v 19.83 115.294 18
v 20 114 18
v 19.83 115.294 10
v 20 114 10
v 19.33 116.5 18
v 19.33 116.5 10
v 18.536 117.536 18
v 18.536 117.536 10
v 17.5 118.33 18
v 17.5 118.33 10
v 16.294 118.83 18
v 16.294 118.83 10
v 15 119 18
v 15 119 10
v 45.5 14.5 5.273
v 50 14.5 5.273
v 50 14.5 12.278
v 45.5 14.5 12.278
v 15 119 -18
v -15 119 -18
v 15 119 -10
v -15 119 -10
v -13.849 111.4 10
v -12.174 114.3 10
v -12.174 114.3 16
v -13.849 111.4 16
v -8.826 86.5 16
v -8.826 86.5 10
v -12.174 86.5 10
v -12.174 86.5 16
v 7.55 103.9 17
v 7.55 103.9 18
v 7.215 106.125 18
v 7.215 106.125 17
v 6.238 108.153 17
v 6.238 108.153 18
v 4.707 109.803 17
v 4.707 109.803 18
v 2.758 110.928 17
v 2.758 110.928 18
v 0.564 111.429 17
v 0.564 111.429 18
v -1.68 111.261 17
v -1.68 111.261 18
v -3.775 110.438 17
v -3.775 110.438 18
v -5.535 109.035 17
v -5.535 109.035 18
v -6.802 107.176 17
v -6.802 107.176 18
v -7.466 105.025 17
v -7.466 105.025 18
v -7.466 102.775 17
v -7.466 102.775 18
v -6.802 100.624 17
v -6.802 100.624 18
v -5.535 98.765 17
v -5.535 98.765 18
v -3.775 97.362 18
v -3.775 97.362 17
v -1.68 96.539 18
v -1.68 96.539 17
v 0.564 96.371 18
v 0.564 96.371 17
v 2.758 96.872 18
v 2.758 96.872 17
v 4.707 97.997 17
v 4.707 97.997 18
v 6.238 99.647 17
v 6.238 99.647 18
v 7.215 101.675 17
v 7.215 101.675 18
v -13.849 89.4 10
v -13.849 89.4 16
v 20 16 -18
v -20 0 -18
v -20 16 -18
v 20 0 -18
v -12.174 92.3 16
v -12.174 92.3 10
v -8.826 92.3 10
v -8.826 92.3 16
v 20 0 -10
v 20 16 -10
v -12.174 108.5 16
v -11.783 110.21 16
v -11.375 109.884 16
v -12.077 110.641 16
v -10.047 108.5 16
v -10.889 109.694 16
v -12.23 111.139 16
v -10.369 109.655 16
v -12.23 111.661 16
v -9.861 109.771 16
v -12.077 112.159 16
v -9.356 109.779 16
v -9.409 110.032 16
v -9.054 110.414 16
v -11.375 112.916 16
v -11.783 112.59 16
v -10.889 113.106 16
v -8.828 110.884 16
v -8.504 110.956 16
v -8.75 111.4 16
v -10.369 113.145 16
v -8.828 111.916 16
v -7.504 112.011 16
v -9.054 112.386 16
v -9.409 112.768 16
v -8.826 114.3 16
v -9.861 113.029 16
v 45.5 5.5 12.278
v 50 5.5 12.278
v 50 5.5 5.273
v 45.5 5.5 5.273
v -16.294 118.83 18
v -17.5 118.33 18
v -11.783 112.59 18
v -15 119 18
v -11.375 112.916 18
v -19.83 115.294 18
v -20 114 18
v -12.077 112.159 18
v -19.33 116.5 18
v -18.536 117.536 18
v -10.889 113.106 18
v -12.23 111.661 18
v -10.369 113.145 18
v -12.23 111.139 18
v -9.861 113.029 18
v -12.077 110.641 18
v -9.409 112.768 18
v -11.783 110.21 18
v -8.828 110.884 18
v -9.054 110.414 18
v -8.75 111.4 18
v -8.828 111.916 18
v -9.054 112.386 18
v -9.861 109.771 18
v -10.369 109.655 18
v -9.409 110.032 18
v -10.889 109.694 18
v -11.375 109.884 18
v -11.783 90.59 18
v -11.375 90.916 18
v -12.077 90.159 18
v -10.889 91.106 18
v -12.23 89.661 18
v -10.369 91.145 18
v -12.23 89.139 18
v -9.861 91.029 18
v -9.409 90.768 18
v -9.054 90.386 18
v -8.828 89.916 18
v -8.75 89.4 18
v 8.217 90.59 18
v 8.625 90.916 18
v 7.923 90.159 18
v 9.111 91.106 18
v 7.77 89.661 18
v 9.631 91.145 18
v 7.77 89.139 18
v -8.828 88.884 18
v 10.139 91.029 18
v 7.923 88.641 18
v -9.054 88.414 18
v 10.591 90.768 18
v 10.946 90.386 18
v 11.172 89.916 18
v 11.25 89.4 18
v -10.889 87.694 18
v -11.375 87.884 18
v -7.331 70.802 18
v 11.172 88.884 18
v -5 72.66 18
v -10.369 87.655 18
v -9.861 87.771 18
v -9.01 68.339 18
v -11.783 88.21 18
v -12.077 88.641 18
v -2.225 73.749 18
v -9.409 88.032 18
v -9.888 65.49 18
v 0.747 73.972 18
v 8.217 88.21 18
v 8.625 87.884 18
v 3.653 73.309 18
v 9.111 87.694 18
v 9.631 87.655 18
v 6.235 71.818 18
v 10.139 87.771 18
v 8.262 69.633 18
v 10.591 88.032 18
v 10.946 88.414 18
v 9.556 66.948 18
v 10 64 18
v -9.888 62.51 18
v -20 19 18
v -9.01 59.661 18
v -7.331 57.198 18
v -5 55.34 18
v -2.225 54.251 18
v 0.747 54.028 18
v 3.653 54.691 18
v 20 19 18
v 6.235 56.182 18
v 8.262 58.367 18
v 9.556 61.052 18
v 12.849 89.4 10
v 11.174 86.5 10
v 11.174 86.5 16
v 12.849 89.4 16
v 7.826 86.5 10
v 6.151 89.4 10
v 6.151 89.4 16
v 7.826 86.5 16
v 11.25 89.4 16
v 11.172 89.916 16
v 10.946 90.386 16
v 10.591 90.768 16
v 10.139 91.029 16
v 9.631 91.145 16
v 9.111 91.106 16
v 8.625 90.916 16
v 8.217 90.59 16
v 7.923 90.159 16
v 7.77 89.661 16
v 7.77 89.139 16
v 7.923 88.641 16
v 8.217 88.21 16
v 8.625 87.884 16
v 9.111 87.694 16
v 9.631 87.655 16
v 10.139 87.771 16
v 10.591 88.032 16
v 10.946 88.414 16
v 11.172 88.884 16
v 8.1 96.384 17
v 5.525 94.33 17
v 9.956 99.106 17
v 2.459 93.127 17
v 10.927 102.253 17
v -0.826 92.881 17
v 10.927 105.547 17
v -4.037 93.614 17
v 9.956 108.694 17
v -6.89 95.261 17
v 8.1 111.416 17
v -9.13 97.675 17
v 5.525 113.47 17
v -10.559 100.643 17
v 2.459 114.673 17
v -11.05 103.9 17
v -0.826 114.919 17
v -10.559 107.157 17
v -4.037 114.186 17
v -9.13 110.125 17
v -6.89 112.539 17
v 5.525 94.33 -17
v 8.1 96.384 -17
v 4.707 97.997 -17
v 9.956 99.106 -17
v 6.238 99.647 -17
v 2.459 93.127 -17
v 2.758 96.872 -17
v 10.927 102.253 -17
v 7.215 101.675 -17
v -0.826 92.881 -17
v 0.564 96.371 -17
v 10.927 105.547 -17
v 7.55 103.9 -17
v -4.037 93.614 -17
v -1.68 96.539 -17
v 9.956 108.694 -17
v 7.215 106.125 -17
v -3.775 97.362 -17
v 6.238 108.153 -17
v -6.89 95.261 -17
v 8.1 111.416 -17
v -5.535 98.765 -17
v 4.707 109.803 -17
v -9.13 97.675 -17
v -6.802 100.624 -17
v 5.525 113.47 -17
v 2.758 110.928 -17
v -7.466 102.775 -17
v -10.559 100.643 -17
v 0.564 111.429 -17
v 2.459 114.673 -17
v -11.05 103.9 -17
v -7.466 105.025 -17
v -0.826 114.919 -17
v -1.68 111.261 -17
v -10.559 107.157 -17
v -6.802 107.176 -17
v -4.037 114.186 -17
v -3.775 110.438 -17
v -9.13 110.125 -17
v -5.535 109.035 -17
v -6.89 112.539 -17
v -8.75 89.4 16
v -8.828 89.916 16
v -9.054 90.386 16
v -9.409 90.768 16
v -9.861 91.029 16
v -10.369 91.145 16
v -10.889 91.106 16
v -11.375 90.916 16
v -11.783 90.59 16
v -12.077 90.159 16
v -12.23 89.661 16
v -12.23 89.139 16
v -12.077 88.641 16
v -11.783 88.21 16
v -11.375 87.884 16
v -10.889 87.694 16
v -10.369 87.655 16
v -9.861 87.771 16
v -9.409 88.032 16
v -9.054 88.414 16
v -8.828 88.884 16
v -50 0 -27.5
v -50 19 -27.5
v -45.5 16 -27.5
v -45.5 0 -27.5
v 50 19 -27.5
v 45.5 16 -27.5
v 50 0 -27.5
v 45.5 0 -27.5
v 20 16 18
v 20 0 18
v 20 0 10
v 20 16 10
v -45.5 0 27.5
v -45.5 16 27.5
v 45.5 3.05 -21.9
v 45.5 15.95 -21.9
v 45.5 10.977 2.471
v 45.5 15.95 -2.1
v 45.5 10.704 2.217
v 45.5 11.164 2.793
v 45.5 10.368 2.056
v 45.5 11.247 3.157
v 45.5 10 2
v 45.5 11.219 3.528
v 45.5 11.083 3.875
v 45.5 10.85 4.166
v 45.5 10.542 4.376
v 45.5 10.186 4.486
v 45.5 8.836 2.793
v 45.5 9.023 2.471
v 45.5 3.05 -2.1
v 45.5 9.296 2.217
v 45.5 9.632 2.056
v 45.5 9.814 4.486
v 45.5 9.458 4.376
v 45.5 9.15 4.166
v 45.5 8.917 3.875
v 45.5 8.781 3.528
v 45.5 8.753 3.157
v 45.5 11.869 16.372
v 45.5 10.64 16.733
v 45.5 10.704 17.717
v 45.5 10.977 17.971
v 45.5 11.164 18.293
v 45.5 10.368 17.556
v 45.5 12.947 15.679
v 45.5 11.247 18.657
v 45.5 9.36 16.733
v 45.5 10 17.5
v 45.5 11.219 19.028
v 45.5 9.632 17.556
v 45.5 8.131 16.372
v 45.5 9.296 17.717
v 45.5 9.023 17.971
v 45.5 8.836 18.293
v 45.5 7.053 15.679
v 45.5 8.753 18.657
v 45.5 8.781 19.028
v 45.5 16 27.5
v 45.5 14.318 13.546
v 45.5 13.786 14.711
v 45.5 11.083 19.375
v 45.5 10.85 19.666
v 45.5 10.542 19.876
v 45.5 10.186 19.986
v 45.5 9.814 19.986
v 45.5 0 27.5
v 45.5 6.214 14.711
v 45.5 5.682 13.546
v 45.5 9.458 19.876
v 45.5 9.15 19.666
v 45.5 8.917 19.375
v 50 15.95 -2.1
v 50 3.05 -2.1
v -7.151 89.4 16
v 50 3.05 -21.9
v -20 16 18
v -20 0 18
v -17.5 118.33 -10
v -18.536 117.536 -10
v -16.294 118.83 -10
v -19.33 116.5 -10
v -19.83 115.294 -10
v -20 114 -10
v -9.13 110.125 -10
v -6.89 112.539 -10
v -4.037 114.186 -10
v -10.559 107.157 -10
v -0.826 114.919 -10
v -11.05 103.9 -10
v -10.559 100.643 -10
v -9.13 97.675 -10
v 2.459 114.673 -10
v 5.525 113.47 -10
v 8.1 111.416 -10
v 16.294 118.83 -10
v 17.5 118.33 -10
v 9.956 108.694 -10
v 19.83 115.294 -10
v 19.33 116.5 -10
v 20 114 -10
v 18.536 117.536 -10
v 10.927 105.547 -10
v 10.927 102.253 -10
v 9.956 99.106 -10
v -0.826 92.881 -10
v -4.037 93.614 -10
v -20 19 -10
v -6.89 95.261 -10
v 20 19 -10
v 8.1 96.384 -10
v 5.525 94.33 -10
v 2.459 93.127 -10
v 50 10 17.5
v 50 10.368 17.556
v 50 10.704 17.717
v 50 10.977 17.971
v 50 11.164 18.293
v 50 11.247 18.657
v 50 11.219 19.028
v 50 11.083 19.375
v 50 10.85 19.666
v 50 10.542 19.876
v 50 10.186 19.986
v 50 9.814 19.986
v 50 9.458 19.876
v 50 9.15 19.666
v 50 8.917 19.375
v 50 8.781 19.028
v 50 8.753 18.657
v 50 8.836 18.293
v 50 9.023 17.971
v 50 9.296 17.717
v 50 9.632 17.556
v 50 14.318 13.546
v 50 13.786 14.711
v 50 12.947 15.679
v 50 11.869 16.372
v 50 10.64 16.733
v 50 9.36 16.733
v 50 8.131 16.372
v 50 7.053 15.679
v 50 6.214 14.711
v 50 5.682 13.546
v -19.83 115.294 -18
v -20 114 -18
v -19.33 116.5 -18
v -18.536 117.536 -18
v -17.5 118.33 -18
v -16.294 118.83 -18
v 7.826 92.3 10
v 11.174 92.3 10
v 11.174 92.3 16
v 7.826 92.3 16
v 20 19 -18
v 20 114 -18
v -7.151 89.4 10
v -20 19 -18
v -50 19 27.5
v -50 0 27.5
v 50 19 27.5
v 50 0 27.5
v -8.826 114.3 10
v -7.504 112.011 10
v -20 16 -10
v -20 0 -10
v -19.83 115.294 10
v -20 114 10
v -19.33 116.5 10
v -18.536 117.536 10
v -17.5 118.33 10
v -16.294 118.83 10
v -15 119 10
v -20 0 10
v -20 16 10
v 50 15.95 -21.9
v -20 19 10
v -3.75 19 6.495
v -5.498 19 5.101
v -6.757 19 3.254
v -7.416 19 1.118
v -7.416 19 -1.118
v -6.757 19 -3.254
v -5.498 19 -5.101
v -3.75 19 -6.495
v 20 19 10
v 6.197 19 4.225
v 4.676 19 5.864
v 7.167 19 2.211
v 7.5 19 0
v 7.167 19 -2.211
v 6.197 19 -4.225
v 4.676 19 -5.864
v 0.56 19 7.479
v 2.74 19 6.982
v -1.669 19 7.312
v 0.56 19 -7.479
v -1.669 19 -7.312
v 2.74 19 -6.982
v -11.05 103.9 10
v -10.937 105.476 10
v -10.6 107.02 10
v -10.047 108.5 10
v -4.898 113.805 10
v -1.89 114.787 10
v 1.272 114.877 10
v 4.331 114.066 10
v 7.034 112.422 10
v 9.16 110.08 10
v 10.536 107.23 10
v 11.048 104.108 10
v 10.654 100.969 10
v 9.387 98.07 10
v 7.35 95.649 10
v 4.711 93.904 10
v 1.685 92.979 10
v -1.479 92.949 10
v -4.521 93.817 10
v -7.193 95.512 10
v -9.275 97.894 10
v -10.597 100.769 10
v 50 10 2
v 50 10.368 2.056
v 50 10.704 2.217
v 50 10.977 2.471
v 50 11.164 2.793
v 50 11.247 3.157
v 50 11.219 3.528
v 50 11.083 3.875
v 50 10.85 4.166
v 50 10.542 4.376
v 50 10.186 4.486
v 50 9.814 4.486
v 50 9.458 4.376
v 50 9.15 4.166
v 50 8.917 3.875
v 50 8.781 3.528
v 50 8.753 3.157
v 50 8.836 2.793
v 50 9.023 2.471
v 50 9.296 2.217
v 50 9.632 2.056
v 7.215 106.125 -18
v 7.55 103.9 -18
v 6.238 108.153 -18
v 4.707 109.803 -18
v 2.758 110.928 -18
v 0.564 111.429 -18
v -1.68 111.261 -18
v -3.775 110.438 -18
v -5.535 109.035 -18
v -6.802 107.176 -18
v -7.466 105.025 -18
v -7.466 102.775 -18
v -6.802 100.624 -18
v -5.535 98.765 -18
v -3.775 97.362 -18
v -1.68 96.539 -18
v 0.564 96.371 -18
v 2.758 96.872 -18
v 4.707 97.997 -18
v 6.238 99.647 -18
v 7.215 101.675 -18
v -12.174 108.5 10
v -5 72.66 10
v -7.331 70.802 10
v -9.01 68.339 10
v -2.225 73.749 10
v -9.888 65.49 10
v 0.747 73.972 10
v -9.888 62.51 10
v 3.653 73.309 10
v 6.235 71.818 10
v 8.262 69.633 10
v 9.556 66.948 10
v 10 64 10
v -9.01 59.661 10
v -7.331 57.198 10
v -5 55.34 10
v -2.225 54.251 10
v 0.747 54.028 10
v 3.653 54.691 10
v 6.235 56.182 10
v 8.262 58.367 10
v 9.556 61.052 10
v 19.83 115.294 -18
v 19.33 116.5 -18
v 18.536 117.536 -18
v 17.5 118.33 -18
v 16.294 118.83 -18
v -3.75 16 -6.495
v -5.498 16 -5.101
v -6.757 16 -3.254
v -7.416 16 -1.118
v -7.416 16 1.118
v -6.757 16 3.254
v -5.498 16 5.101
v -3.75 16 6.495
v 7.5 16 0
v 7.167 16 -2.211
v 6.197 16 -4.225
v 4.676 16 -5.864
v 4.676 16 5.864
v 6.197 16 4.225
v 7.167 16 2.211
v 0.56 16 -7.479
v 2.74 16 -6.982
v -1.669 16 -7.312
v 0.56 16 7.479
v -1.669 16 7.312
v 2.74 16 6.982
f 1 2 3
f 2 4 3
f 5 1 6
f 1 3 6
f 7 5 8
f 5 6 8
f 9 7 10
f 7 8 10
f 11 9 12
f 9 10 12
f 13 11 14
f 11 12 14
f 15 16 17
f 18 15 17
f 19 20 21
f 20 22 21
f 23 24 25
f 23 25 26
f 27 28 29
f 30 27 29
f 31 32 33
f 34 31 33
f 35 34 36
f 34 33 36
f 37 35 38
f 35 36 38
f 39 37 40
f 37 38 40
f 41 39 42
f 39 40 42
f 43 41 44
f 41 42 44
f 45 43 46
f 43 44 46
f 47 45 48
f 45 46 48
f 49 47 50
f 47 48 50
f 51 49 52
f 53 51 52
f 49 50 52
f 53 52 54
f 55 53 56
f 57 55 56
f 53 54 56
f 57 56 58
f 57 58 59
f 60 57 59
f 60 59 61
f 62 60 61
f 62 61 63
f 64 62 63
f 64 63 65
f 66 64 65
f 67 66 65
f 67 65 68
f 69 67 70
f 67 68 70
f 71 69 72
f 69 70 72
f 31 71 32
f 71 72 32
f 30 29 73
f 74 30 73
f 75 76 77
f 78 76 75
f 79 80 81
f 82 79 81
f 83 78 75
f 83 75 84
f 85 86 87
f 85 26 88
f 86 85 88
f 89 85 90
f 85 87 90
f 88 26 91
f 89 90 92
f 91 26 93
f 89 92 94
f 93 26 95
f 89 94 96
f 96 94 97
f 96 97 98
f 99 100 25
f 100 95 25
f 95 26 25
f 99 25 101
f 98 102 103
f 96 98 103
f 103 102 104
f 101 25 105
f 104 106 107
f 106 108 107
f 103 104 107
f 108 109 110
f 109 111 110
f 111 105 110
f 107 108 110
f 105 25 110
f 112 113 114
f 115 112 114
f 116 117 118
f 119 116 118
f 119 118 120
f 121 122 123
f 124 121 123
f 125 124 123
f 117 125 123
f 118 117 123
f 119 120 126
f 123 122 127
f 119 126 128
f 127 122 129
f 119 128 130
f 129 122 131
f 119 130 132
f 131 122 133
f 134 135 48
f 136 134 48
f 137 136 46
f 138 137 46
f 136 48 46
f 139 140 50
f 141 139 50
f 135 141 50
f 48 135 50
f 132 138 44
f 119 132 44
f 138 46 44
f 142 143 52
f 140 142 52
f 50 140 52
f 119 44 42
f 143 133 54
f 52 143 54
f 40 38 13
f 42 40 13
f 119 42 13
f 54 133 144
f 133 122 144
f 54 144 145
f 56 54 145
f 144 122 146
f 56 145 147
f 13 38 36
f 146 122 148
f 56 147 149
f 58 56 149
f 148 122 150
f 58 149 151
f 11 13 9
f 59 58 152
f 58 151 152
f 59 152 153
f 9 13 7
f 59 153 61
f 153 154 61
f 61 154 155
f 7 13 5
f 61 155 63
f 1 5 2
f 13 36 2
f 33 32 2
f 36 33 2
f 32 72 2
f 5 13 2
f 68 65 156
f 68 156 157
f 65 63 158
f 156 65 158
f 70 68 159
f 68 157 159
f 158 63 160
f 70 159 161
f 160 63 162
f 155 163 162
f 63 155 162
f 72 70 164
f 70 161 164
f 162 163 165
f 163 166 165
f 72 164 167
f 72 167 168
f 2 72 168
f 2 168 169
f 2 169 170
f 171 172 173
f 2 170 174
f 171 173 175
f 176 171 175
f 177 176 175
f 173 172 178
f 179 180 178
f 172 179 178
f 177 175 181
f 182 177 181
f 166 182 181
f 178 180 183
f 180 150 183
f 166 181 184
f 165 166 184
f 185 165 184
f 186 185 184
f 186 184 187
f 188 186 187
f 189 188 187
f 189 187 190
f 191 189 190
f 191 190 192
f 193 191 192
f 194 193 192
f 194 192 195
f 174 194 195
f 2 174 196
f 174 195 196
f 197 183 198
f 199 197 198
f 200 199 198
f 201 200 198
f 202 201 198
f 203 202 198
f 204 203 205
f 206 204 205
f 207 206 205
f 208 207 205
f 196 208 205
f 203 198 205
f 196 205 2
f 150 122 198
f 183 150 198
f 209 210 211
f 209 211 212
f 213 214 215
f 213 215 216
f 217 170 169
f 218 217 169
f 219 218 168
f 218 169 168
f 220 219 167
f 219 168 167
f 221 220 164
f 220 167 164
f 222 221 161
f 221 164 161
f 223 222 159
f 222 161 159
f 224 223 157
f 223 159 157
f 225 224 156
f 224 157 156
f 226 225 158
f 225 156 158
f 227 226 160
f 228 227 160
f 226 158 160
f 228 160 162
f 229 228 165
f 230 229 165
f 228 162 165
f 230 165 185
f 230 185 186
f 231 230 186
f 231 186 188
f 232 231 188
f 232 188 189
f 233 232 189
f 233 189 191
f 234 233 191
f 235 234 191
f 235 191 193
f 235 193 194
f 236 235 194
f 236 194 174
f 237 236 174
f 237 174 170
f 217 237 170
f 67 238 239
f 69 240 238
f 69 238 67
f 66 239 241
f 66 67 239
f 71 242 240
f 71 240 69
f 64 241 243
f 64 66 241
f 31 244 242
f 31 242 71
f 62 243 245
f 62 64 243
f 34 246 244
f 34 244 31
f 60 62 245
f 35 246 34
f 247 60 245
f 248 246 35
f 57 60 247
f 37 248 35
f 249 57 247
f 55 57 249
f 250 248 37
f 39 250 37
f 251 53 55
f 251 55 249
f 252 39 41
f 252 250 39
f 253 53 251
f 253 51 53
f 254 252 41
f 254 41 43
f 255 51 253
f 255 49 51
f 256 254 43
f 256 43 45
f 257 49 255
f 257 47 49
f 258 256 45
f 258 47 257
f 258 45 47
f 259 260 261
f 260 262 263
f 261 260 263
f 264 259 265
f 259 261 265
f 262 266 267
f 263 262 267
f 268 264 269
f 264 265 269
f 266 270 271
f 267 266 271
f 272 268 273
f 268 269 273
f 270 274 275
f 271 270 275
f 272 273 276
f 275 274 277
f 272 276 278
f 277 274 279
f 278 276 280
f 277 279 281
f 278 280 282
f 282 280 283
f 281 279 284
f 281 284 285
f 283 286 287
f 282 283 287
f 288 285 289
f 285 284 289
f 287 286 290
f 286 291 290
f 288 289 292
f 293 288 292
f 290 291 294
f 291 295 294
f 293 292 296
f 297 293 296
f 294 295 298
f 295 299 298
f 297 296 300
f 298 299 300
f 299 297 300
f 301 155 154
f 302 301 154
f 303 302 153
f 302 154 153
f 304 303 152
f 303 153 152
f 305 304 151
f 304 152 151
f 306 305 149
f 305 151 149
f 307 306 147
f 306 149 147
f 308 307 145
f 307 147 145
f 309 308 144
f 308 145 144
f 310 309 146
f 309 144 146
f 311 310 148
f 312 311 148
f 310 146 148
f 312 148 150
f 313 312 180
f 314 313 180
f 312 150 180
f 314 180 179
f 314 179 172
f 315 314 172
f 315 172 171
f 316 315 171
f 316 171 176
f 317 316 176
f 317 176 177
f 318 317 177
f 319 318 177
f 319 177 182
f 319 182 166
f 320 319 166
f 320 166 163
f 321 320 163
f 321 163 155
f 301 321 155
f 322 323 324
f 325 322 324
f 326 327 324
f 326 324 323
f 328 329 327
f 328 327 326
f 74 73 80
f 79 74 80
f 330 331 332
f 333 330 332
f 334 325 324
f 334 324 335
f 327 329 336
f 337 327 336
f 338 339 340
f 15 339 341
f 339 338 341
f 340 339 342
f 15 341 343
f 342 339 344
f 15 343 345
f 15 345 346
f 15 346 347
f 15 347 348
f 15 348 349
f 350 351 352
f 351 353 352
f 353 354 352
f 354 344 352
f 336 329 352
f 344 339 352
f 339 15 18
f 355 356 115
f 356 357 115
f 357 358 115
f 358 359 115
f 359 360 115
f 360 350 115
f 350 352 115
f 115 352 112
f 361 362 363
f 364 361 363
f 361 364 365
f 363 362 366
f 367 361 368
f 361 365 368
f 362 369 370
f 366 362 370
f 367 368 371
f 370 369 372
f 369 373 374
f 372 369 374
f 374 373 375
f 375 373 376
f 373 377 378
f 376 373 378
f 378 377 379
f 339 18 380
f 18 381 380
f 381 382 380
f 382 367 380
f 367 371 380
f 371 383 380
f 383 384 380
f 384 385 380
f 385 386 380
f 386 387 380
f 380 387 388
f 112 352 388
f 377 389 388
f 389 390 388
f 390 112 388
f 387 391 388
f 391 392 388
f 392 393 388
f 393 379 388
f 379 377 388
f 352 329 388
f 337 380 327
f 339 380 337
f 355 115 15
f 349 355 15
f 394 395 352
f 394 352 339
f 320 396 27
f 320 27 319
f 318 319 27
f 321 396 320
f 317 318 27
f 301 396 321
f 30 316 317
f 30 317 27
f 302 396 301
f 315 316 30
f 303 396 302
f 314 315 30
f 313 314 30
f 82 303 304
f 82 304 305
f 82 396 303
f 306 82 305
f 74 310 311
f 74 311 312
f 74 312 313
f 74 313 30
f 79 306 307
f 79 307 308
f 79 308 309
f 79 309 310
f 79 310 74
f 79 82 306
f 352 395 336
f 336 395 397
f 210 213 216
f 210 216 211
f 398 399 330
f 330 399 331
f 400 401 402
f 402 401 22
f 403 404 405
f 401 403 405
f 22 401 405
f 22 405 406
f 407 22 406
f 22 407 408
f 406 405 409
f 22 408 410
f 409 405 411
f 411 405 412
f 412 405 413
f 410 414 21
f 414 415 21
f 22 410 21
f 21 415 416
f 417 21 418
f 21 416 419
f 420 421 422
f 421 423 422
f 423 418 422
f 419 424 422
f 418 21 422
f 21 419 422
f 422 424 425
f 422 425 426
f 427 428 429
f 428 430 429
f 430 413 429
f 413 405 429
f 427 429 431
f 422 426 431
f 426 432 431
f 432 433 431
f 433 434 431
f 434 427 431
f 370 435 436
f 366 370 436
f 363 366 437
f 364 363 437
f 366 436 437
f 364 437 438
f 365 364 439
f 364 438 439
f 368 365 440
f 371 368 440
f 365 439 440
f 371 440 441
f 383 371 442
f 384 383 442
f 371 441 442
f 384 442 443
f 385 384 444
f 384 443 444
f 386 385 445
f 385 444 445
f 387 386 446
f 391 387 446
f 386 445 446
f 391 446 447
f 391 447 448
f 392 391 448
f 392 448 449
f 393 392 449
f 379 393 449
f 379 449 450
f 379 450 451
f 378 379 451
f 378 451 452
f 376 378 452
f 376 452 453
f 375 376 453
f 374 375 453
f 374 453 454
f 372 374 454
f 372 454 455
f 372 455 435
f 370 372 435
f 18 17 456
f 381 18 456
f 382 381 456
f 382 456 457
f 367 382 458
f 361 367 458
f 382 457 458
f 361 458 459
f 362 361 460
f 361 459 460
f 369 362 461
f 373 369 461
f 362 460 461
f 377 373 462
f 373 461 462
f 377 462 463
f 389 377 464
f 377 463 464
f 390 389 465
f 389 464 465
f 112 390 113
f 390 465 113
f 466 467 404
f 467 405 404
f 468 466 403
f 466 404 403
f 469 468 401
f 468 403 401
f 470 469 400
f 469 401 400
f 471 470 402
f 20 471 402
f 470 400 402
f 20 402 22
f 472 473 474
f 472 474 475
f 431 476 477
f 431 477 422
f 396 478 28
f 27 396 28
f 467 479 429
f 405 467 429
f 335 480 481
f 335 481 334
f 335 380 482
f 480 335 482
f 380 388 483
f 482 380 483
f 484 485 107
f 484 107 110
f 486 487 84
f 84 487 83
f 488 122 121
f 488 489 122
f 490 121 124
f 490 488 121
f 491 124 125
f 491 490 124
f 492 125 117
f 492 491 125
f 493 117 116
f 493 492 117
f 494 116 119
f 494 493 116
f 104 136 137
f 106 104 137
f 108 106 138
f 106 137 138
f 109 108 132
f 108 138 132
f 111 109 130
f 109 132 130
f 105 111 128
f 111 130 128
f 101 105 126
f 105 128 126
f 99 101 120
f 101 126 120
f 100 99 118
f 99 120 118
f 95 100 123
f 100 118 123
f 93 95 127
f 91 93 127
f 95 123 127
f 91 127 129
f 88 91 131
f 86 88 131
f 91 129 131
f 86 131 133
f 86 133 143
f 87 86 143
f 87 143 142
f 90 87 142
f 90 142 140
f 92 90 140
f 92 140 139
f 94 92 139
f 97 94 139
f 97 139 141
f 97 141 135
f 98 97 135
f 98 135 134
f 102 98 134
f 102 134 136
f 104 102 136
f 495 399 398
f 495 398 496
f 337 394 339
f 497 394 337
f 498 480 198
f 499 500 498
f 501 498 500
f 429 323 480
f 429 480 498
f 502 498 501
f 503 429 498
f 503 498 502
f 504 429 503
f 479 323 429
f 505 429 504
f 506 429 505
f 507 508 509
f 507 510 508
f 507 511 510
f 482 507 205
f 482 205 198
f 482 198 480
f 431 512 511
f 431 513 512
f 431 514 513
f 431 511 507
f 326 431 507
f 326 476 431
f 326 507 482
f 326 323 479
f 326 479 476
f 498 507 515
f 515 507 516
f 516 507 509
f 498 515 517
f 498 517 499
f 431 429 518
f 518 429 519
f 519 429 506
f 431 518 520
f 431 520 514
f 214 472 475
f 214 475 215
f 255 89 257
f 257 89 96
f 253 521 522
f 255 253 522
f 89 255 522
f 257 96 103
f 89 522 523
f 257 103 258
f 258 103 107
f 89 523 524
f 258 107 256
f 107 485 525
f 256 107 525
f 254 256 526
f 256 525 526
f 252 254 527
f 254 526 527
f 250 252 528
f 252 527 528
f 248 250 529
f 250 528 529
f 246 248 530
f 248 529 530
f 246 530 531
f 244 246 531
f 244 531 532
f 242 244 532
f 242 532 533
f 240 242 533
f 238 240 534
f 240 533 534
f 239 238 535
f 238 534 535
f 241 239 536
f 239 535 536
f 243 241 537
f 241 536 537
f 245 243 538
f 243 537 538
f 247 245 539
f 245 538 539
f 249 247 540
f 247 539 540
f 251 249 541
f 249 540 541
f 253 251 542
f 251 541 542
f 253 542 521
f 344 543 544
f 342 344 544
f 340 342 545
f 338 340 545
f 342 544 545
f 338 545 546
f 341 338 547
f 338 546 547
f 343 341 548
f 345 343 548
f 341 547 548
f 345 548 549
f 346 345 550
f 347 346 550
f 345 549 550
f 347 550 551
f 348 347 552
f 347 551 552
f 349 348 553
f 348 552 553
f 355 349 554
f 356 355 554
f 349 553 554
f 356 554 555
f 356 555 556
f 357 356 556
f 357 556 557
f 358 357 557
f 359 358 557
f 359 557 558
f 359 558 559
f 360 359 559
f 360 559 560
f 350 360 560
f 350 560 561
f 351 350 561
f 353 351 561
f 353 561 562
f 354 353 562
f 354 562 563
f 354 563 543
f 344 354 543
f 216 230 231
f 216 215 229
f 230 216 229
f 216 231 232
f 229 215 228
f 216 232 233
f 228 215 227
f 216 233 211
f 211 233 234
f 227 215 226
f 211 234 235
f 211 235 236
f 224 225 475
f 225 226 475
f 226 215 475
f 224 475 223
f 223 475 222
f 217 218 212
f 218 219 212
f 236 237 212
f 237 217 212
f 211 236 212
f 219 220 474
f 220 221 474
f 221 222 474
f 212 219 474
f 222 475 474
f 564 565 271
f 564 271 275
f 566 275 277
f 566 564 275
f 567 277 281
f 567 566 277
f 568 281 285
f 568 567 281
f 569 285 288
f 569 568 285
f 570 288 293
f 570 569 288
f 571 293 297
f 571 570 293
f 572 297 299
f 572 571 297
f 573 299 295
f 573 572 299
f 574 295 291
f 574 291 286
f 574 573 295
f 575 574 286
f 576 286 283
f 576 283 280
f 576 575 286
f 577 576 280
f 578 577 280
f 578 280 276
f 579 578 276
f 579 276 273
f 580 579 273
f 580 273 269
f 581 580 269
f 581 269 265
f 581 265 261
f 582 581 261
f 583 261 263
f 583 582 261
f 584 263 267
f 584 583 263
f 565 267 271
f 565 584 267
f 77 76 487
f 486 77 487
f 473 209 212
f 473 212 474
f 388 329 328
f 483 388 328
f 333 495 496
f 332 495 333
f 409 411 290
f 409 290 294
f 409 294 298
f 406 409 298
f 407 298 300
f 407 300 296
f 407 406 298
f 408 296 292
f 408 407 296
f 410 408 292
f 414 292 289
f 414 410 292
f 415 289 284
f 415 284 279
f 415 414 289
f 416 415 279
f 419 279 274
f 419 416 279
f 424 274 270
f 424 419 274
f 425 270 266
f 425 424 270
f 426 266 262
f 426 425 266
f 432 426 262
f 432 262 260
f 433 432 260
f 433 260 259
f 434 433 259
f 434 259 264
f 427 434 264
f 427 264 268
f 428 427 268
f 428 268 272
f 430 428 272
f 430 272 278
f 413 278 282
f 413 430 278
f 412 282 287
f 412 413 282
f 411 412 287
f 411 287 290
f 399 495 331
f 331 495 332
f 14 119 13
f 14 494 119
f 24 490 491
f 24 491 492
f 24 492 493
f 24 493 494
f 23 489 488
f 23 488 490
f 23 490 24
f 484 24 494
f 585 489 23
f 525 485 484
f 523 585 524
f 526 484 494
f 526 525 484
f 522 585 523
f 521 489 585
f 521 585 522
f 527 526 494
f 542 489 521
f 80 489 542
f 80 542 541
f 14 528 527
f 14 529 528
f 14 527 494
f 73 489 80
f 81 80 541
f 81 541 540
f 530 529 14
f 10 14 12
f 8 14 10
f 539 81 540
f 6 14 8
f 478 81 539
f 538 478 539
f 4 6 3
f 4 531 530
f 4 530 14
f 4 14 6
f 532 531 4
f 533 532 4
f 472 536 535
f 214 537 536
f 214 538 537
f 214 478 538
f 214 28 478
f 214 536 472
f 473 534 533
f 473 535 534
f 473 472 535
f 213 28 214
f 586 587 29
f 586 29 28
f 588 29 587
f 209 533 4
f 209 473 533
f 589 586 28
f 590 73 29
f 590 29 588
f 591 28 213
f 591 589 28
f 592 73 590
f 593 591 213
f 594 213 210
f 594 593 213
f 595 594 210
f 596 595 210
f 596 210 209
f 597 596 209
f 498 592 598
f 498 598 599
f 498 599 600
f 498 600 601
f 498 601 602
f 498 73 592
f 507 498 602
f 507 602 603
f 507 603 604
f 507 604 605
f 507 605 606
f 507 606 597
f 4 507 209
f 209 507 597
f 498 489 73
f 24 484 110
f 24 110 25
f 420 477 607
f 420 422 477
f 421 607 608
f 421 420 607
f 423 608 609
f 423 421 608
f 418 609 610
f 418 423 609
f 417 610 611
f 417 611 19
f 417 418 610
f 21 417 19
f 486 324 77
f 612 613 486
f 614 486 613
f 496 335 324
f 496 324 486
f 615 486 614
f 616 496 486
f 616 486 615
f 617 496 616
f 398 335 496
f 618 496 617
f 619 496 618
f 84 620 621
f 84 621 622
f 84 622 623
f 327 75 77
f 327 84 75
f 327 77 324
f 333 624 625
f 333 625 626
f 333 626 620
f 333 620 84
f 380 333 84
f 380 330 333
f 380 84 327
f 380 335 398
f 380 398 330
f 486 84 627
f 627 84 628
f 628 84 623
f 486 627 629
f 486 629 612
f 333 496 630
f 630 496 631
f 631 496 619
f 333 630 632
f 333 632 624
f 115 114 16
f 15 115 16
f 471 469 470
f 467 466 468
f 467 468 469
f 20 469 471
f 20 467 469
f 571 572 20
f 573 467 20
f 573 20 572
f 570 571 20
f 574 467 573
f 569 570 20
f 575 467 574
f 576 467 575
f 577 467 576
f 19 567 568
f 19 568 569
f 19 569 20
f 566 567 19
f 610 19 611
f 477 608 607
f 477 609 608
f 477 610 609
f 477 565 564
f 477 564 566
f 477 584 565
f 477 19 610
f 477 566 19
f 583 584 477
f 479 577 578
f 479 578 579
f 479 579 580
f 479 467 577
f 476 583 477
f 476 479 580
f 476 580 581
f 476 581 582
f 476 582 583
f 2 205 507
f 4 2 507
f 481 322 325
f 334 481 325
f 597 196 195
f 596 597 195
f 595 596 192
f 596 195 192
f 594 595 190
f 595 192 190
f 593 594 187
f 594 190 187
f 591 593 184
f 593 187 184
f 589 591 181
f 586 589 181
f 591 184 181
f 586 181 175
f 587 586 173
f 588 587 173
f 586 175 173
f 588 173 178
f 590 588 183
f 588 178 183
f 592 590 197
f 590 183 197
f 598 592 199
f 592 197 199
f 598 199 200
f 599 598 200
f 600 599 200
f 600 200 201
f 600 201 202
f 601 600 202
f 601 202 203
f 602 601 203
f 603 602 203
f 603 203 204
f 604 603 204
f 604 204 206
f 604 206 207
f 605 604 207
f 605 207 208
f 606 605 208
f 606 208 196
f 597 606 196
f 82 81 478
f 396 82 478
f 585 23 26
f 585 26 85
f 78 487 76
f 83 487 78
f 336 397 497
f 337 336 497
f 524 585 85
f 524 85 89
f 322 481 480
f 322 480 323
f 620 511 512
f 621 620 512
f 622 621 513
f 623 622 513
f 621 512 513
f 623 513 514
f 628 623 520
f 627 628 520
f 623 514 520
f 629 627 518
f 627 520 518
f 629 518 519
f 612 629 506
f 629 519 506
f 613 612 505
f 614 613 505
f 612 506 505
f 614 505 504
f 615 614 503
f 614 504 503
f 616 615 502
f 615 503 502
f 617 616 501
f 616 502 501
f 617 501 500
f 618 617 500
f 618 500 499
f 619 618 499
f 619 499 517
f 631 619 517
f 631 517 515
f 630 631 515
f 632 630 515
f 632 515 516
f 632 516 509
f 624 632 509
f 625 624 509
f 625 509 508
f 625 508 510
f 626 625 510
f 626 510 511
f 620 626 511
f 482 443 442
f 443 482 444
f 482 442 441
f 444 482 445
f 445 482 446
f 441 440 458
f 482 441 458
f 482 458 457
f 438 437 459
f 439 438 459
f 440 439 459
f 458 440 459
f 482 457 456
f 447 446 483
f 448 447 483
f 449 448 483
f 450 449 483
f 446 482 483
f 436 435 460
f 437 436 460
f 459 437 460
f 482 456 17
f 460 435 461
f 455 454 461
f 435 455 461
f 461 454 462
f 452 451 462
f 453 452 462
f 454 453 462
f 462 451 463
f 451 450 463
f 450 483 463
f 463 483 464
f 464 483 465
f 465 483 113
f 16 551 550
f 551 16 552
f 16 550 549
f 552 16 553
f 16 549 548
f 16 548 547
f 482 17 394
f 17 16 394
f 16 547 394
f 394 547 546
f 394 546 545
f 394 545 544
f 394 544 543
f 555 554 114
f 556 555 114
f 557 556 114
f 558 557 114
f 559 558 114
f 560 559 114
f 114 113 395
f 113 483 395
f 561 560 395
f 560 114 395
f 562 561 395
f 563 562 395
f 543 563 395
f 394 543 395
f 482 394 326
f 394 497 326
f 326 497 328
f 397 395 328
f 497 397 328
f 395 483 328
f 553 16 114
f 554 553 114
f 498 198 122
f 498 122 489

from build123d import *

# Parameters (mm, degrees)
SKETCH1_W            = 100
SKETCH1_H            = 55
BOSS_EXTRUDE1_DEPTH  = 19
SKETCH2_W            = 91
SKETCH2_H            = 91
CUT_EXTRUDE1_DEPTH   = 16
CUT_EXTRUDE3_REACH   = 102
SKETCH3_R            = 1.25
CUT_EXTRUDE13_REACH  = 102
SKETCH15_W           = 19.8
SKETCH15_H           = 12.9
BOSS_EXTRUDE2_START  = -19
SKETCH6_W            = 40
SKETCH6_H            = 8
BOSS_EXTRUDE2_DEPTH  = 119
SKETCH7_R            = 11.05
CUT_EXTRUDE5_DEPTH   = 7
SKETCH8_R            = 7.55
CUT_EXTRUDE6_DEPTH   = 1
FILLET1_R            = 5
FILLET1_OF_MIRROR2_R = 5
CUT_EXTRUDE7_REACH   = 21
SKETCH9_R            = 7.5
CUT_EXTRUDE10_REACH  = 47.5
SKETCH12_R           = 10
CUT_EXTRUDE11_REACH  = 47.5
SKETCH13_R           = 1.75
CUT_EXTRUDE12_DEPTH  = 6


with BuildPart() as part:
    # Sketch1 → Boss-Extrude1 (new body)
    with BuildSketch(Plane(origin=(0, 0, 0), x_dir=(1, 0, 0), z_dir=(0, 1, 0))):
        Rectangle(SKETCH1_W, SKETCH1_H)
    extrude(amount=BOSS_EXTRUDE1_DEPTH)

    # Sketch2 → Cut-Extrude1 (cut)
    with BuildSketch(Plane.XZ):
        Rectangle(SKETCH2_W, SKETCH2_H)
    extrude(amount=-CUT_EXTRUDE1_DEPTH, mode=Mode.SUBTRACT)

    # Sketch3 → Cut-Extrude3 (cut, up to next)
    with BuildSketch(Plane(origin=(50, 0, 0), x_dir=(0, 0, -1), z_dir=(1, 0, 0)), mode=Mode.PRIVATE) as cut_extrude3_sk1:
        with Locations((-18.75, 10)):
            Circle(SKETCH3_R)
    cut_extrude3_tool1 = extrude(cut_extrude3_sk1.sketch, amount=-CUT_EXTRUDE3_REACH, mode=Mode.PRIVATE) & part.part
    add(cut_extrude3_tool1.solids().sort_by_distance((50, 10, 18.75))[0], mode=Mode.SUBTRACT)
    # Sketch3 → Cut-Extrude3 (cut, up to next)
    with BuildSketch(Plane(origin=(50, 0, 0), x_dir=(0, 0, -1), z_dir=(1, 0, 0)), mode=Mode.PRIVATE) as cut_extrude3_sk2:
        with Locations((-3.25, 10)):
            Circle(SKETCH3_R)
    cut_extrude3_tool2 = extrude(cut_extrude3_sk2.sketch, amount=-CUT_EXTRUDE3_REACH, mode=Mode.PRIVATE) & part.part
    add(cut_extrude3_tool2.solids().sort_by_distance((50, 10, 3.25))[0], mode=Mode.SUBTRACT)
    # Sketch3 → Cut-Extrude3 (cut, up to next)
    with BuildSketch(Plane(origin=(50, 0, 0), x_dir=(0, 0, -1), z_dir=(1, 0, 0)), mode=Mode.PRIVATE) as cut_extrude3_sk3:
        with BuildLine():
            Line((-5.272727273, 5.5), (-5.272727273, 14.5))
            Line((-5.272727273, 14.5), (-12.278409091, 14.5))
            ThreePointArc((-12.278409091, 14.5), (-16.778409091, 10), (-12.278409091, 5.5))
            Line((-12.278409091, 5.5), (-5.272727273, 5.5))
        make_face()
    cut_extrude3_tool3 = extrude(cut_extrude3_sk3.sketch, amount=-CUT_EXTRUDE3_REACH, mode=Mode.PRIVATE) & part.part
    add(cut_extrude3_tool3.solids().sort_by_distance((50, 10, 10.590569))[0], mode=Mode.SUBTRACT)

    # Sketch15 → Cut-Extrude13 (cut, up to next)
    with BuildSketch(Plane(origin=(50, 0, 0), x_dir=(0, 0, -1), z_dir=(1, 0, 0)), mode=Mode.PRIVATE) as cut_extrude13_sk1:
        with Locations((12, 9.5)):
            Rectangle(SKETCH15_W, SKETCH15_H)
    cut_extrude13_tool1 = extrude(cut_extrude13_sk1.sketch, amount=-CUT_EXTRUDE13_REACH, mode=Mode.PRIVATE) & part.part
    add(cut_extrude13_tool1.solids().sort_by_distance((50, 9.5, -12))[0], mode=Mode.SUBTRACT)

    # Sketch6 → Boss-Extrude2 (add)
    with BuildSketch(Plane(origin=(0, 19, 0), x_dir=(1, 0, 0), z_dir=(0, 1, 0)).offset(BOSS_EXTRUDE2_START)):
        with Locations((0, -14)):
            Rectangle(SKETCH6_W, SKETCH6_H)
    boss_extrude2 = extrude(amount=BOSS_EXTRUDE2_DEPTH)

    # Sketch7 → Cut-Extrude5 (cut)
    with BuildSketch(Plane(origin=(0, 0, 10), x_dir=(-1, 0, 0), z_dir=(0, 0, -1))):
        with Locations((0, 103.9)):
            Circle(SKETCH7_R)
    cut_extrude5 = extrude(amount=-CUT_EXTRUDE5_DEPTH, mode=Mode.SUBTRACT)

    # Sketch8 → Cut-Extrude6 (cut)
    with BuildSketch(Plane.XY.offset(18)):
        with Locations((0, 103.9)):
            Circle(SKETCH8_R)
    cut_extrude6 = extrude(amount=-CUT_EXTRUDE6_DEPTH, mode=Mode.SUBTRACT)

    # Fillet1
    fillet1_edges = [part.edges().sort_by_distance(p)[0] for p in [
        (-20, 119, 14),
        (20, 119, 14),
    ]]
    fillet(fillet1_edges, radius=FILLET1_R)

    # Mirror2: Boss-Extrude2, Cut-Extrude5, Cut-Extrude6 across plane
    add(boss_extrude2.mirror(Plane.XY))
    add(cut_extrude5.mirror(Plane.XY), mode=Mode.SUBTRACT)
    add(cut_extrude6.mirror(Plane.XY), mode=Mode.SUBTRACT)

    # Fillet1 of Mirror2
    fillet1_of_mirror2_edges = [part.edges().sort_by_distance(p)[0] for p in [
        (-20, 119, -14),
        (20, 119, -14),
    ]]
    fillet(fillet1_of_mirror2_edges, radius=FILLET1_OF_MIRROR2_R)

    # Sketch9 → Cut-Extrude7 (cut, up to next)
    with BuildSketch(Plane(origin=(0, 19, 0), x_dir=(1, 0, 0), z_dir=(0, 1, 0)), mode=Mode.PRIVATE) as cut_extrude7_sk1:
        Circle(SKETCH9_R)
    cut_extrude7_tool1 = extrude(cut_extrude7_sk1.sketch, amount=-CUT_EXTRUDE7_REACH, mode=Mode.PRIVATE) & part.part
    add(cut_extrude7_tool1.solids().sort_by_distance((0, 19, 0))[0], mode=Mode.SUBTRACT)

    # Sketch12 → Cut-Extrude10 (cut, up to next)
    with BuildSketch(Plane.XY.offset(18), mode=Mode.PRIVATE) as cut_extrude10_sk1:
        with Locations((0, 64)):
            Circle(SKETCH12_R)
    cut_extrude10_tool1 = extrude(cut_extrude10_sk1.sketch, amount=-CUT_EXTRUDE10_REACH, mode=Mode.PRIVATE) & part.part
    add(cut_extrude10_tool1.solids().sort_by_distance((0, 64, 18))[0], mode=Mode.SUBTRACT)

    # Sketch13 → Cut-Extrude11 (cut, up to next)
    with BuildSketch(Plane.XY.offset(18), mode=Mode.PRIVATE) as cut_extrude11_sk1:
        with Locations((-10.5, 89.4)):
            Circle(SKETCH13_R)
    cut_extrude11_tool1 = extrude(cut_extrude11_sk1.sketch, amount=-CUT_EXTRUDE11_REACH, mode=Mode.PRIVATE) & part.part
    add(cut_extrude11_tool1.solids().sort_by_distance((-10.5, 89.4, 18))[0], mode=Mode.SUBTRACT)
    # Sketch13 → Cut-Extrude11 (cut, up to next)
    with BuildSketch(Plane.XY.offset(18), mode=Mode.PRIVATE) as cut_extrude11_sk2:
        with Locations((-10.5, 111.4)):
            Circle(SKETCH13_R)
    cut_extrude11_tool2 = extrude(cut_extrude11_sk2.sketch, amount=-CUT_EXTRUDE11_REACH, mode=Mode.PRIVATE) & part.part
    add(cut_extrude11_tool2.solids().sort_by_distance((-10.5, 111.4, 18))[0], mode=Mode.SUBTRACT)
    # Sketch13 → Cut-Extrude11 (cut, up to next)
    with BuildSketch(Plane.XY.offset(18), mode=Mode.PRIVATE) as cut_extrude11_sk3:
        with Locations((9.5, 89.4)):
            Circle(SKETCH13_R)
    cut_extrude11_tool3 = extrude(cut_extrude11_sk3.sketch, amount=-CUT_EXTRUDE11_REACH, mode=Mode.PRIVATE) & part.part
    add(cut_extrude11_tool3.solids().sort_by_distance((9.5, 89.4, 18))[0], mode=Mode.SUBTRACT)

    # Sketch14 → Cut-Extrude12 (cut)
    with BuildSketch(Plane(origin=(0, 0, 10), x_dir=(-1, 0, 0), z_dir=(0, 0, -1))):
        Polygon((-11.174315781, 92.3), (-7.825684219, 92.3), (-6.151368439, 89.4), (-7.825684219, 86.5), (-11.174315781, 86.5), (-12.848631561, 89.4), align=None)
        Polygon((13.848631561, 89.4), (12.174315781, 92.3), (8.825684219, 92.3), (7.151368439, 89.4), (8.825684219, 86.5), (12.174315781, 86.5), align=None)
        Polygon((7.151368439, 111.4), (8.825684219, 114.3), (12.174315781, 114.3), (13.848631561, 111.4), (12.174315781, 108.5), (8.825684219, 108.5), align=None)
    extrude(amount=-CUT_EXTRUDE12_DEPTH, mode=Mode.SUBTRACT)


solid = part.part
